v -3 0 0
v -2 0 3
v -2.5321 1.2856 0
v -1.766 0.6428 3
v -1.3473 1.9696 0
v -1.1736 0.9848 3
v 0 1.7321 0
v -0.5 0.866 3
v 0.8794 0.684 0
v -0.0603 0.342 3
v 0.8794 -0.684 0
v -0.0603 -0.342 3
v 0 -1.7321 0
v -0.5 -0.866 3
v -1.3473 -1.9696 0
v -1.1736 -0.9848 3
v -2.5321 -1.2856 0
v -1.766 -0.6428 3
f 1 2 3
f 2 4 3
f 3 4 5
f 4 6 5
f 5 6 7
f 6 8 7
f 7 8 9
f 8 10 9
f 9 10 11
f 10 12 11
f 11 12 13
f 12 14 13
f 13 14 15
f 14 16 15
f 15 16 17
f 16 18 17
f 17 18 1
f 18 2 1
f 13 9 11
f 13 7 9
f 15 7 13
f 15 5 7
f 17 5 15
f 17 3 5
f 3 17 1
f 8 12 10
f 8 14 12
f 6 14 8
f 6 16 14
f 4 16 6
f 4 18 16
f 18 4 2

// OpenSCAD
// negative scale flips the orientation
scale([-1, 1, 1]) translate([1, 0, 0]) cylinder(h = 3, r1 = 2, r2 = 1, $fn = 9);
